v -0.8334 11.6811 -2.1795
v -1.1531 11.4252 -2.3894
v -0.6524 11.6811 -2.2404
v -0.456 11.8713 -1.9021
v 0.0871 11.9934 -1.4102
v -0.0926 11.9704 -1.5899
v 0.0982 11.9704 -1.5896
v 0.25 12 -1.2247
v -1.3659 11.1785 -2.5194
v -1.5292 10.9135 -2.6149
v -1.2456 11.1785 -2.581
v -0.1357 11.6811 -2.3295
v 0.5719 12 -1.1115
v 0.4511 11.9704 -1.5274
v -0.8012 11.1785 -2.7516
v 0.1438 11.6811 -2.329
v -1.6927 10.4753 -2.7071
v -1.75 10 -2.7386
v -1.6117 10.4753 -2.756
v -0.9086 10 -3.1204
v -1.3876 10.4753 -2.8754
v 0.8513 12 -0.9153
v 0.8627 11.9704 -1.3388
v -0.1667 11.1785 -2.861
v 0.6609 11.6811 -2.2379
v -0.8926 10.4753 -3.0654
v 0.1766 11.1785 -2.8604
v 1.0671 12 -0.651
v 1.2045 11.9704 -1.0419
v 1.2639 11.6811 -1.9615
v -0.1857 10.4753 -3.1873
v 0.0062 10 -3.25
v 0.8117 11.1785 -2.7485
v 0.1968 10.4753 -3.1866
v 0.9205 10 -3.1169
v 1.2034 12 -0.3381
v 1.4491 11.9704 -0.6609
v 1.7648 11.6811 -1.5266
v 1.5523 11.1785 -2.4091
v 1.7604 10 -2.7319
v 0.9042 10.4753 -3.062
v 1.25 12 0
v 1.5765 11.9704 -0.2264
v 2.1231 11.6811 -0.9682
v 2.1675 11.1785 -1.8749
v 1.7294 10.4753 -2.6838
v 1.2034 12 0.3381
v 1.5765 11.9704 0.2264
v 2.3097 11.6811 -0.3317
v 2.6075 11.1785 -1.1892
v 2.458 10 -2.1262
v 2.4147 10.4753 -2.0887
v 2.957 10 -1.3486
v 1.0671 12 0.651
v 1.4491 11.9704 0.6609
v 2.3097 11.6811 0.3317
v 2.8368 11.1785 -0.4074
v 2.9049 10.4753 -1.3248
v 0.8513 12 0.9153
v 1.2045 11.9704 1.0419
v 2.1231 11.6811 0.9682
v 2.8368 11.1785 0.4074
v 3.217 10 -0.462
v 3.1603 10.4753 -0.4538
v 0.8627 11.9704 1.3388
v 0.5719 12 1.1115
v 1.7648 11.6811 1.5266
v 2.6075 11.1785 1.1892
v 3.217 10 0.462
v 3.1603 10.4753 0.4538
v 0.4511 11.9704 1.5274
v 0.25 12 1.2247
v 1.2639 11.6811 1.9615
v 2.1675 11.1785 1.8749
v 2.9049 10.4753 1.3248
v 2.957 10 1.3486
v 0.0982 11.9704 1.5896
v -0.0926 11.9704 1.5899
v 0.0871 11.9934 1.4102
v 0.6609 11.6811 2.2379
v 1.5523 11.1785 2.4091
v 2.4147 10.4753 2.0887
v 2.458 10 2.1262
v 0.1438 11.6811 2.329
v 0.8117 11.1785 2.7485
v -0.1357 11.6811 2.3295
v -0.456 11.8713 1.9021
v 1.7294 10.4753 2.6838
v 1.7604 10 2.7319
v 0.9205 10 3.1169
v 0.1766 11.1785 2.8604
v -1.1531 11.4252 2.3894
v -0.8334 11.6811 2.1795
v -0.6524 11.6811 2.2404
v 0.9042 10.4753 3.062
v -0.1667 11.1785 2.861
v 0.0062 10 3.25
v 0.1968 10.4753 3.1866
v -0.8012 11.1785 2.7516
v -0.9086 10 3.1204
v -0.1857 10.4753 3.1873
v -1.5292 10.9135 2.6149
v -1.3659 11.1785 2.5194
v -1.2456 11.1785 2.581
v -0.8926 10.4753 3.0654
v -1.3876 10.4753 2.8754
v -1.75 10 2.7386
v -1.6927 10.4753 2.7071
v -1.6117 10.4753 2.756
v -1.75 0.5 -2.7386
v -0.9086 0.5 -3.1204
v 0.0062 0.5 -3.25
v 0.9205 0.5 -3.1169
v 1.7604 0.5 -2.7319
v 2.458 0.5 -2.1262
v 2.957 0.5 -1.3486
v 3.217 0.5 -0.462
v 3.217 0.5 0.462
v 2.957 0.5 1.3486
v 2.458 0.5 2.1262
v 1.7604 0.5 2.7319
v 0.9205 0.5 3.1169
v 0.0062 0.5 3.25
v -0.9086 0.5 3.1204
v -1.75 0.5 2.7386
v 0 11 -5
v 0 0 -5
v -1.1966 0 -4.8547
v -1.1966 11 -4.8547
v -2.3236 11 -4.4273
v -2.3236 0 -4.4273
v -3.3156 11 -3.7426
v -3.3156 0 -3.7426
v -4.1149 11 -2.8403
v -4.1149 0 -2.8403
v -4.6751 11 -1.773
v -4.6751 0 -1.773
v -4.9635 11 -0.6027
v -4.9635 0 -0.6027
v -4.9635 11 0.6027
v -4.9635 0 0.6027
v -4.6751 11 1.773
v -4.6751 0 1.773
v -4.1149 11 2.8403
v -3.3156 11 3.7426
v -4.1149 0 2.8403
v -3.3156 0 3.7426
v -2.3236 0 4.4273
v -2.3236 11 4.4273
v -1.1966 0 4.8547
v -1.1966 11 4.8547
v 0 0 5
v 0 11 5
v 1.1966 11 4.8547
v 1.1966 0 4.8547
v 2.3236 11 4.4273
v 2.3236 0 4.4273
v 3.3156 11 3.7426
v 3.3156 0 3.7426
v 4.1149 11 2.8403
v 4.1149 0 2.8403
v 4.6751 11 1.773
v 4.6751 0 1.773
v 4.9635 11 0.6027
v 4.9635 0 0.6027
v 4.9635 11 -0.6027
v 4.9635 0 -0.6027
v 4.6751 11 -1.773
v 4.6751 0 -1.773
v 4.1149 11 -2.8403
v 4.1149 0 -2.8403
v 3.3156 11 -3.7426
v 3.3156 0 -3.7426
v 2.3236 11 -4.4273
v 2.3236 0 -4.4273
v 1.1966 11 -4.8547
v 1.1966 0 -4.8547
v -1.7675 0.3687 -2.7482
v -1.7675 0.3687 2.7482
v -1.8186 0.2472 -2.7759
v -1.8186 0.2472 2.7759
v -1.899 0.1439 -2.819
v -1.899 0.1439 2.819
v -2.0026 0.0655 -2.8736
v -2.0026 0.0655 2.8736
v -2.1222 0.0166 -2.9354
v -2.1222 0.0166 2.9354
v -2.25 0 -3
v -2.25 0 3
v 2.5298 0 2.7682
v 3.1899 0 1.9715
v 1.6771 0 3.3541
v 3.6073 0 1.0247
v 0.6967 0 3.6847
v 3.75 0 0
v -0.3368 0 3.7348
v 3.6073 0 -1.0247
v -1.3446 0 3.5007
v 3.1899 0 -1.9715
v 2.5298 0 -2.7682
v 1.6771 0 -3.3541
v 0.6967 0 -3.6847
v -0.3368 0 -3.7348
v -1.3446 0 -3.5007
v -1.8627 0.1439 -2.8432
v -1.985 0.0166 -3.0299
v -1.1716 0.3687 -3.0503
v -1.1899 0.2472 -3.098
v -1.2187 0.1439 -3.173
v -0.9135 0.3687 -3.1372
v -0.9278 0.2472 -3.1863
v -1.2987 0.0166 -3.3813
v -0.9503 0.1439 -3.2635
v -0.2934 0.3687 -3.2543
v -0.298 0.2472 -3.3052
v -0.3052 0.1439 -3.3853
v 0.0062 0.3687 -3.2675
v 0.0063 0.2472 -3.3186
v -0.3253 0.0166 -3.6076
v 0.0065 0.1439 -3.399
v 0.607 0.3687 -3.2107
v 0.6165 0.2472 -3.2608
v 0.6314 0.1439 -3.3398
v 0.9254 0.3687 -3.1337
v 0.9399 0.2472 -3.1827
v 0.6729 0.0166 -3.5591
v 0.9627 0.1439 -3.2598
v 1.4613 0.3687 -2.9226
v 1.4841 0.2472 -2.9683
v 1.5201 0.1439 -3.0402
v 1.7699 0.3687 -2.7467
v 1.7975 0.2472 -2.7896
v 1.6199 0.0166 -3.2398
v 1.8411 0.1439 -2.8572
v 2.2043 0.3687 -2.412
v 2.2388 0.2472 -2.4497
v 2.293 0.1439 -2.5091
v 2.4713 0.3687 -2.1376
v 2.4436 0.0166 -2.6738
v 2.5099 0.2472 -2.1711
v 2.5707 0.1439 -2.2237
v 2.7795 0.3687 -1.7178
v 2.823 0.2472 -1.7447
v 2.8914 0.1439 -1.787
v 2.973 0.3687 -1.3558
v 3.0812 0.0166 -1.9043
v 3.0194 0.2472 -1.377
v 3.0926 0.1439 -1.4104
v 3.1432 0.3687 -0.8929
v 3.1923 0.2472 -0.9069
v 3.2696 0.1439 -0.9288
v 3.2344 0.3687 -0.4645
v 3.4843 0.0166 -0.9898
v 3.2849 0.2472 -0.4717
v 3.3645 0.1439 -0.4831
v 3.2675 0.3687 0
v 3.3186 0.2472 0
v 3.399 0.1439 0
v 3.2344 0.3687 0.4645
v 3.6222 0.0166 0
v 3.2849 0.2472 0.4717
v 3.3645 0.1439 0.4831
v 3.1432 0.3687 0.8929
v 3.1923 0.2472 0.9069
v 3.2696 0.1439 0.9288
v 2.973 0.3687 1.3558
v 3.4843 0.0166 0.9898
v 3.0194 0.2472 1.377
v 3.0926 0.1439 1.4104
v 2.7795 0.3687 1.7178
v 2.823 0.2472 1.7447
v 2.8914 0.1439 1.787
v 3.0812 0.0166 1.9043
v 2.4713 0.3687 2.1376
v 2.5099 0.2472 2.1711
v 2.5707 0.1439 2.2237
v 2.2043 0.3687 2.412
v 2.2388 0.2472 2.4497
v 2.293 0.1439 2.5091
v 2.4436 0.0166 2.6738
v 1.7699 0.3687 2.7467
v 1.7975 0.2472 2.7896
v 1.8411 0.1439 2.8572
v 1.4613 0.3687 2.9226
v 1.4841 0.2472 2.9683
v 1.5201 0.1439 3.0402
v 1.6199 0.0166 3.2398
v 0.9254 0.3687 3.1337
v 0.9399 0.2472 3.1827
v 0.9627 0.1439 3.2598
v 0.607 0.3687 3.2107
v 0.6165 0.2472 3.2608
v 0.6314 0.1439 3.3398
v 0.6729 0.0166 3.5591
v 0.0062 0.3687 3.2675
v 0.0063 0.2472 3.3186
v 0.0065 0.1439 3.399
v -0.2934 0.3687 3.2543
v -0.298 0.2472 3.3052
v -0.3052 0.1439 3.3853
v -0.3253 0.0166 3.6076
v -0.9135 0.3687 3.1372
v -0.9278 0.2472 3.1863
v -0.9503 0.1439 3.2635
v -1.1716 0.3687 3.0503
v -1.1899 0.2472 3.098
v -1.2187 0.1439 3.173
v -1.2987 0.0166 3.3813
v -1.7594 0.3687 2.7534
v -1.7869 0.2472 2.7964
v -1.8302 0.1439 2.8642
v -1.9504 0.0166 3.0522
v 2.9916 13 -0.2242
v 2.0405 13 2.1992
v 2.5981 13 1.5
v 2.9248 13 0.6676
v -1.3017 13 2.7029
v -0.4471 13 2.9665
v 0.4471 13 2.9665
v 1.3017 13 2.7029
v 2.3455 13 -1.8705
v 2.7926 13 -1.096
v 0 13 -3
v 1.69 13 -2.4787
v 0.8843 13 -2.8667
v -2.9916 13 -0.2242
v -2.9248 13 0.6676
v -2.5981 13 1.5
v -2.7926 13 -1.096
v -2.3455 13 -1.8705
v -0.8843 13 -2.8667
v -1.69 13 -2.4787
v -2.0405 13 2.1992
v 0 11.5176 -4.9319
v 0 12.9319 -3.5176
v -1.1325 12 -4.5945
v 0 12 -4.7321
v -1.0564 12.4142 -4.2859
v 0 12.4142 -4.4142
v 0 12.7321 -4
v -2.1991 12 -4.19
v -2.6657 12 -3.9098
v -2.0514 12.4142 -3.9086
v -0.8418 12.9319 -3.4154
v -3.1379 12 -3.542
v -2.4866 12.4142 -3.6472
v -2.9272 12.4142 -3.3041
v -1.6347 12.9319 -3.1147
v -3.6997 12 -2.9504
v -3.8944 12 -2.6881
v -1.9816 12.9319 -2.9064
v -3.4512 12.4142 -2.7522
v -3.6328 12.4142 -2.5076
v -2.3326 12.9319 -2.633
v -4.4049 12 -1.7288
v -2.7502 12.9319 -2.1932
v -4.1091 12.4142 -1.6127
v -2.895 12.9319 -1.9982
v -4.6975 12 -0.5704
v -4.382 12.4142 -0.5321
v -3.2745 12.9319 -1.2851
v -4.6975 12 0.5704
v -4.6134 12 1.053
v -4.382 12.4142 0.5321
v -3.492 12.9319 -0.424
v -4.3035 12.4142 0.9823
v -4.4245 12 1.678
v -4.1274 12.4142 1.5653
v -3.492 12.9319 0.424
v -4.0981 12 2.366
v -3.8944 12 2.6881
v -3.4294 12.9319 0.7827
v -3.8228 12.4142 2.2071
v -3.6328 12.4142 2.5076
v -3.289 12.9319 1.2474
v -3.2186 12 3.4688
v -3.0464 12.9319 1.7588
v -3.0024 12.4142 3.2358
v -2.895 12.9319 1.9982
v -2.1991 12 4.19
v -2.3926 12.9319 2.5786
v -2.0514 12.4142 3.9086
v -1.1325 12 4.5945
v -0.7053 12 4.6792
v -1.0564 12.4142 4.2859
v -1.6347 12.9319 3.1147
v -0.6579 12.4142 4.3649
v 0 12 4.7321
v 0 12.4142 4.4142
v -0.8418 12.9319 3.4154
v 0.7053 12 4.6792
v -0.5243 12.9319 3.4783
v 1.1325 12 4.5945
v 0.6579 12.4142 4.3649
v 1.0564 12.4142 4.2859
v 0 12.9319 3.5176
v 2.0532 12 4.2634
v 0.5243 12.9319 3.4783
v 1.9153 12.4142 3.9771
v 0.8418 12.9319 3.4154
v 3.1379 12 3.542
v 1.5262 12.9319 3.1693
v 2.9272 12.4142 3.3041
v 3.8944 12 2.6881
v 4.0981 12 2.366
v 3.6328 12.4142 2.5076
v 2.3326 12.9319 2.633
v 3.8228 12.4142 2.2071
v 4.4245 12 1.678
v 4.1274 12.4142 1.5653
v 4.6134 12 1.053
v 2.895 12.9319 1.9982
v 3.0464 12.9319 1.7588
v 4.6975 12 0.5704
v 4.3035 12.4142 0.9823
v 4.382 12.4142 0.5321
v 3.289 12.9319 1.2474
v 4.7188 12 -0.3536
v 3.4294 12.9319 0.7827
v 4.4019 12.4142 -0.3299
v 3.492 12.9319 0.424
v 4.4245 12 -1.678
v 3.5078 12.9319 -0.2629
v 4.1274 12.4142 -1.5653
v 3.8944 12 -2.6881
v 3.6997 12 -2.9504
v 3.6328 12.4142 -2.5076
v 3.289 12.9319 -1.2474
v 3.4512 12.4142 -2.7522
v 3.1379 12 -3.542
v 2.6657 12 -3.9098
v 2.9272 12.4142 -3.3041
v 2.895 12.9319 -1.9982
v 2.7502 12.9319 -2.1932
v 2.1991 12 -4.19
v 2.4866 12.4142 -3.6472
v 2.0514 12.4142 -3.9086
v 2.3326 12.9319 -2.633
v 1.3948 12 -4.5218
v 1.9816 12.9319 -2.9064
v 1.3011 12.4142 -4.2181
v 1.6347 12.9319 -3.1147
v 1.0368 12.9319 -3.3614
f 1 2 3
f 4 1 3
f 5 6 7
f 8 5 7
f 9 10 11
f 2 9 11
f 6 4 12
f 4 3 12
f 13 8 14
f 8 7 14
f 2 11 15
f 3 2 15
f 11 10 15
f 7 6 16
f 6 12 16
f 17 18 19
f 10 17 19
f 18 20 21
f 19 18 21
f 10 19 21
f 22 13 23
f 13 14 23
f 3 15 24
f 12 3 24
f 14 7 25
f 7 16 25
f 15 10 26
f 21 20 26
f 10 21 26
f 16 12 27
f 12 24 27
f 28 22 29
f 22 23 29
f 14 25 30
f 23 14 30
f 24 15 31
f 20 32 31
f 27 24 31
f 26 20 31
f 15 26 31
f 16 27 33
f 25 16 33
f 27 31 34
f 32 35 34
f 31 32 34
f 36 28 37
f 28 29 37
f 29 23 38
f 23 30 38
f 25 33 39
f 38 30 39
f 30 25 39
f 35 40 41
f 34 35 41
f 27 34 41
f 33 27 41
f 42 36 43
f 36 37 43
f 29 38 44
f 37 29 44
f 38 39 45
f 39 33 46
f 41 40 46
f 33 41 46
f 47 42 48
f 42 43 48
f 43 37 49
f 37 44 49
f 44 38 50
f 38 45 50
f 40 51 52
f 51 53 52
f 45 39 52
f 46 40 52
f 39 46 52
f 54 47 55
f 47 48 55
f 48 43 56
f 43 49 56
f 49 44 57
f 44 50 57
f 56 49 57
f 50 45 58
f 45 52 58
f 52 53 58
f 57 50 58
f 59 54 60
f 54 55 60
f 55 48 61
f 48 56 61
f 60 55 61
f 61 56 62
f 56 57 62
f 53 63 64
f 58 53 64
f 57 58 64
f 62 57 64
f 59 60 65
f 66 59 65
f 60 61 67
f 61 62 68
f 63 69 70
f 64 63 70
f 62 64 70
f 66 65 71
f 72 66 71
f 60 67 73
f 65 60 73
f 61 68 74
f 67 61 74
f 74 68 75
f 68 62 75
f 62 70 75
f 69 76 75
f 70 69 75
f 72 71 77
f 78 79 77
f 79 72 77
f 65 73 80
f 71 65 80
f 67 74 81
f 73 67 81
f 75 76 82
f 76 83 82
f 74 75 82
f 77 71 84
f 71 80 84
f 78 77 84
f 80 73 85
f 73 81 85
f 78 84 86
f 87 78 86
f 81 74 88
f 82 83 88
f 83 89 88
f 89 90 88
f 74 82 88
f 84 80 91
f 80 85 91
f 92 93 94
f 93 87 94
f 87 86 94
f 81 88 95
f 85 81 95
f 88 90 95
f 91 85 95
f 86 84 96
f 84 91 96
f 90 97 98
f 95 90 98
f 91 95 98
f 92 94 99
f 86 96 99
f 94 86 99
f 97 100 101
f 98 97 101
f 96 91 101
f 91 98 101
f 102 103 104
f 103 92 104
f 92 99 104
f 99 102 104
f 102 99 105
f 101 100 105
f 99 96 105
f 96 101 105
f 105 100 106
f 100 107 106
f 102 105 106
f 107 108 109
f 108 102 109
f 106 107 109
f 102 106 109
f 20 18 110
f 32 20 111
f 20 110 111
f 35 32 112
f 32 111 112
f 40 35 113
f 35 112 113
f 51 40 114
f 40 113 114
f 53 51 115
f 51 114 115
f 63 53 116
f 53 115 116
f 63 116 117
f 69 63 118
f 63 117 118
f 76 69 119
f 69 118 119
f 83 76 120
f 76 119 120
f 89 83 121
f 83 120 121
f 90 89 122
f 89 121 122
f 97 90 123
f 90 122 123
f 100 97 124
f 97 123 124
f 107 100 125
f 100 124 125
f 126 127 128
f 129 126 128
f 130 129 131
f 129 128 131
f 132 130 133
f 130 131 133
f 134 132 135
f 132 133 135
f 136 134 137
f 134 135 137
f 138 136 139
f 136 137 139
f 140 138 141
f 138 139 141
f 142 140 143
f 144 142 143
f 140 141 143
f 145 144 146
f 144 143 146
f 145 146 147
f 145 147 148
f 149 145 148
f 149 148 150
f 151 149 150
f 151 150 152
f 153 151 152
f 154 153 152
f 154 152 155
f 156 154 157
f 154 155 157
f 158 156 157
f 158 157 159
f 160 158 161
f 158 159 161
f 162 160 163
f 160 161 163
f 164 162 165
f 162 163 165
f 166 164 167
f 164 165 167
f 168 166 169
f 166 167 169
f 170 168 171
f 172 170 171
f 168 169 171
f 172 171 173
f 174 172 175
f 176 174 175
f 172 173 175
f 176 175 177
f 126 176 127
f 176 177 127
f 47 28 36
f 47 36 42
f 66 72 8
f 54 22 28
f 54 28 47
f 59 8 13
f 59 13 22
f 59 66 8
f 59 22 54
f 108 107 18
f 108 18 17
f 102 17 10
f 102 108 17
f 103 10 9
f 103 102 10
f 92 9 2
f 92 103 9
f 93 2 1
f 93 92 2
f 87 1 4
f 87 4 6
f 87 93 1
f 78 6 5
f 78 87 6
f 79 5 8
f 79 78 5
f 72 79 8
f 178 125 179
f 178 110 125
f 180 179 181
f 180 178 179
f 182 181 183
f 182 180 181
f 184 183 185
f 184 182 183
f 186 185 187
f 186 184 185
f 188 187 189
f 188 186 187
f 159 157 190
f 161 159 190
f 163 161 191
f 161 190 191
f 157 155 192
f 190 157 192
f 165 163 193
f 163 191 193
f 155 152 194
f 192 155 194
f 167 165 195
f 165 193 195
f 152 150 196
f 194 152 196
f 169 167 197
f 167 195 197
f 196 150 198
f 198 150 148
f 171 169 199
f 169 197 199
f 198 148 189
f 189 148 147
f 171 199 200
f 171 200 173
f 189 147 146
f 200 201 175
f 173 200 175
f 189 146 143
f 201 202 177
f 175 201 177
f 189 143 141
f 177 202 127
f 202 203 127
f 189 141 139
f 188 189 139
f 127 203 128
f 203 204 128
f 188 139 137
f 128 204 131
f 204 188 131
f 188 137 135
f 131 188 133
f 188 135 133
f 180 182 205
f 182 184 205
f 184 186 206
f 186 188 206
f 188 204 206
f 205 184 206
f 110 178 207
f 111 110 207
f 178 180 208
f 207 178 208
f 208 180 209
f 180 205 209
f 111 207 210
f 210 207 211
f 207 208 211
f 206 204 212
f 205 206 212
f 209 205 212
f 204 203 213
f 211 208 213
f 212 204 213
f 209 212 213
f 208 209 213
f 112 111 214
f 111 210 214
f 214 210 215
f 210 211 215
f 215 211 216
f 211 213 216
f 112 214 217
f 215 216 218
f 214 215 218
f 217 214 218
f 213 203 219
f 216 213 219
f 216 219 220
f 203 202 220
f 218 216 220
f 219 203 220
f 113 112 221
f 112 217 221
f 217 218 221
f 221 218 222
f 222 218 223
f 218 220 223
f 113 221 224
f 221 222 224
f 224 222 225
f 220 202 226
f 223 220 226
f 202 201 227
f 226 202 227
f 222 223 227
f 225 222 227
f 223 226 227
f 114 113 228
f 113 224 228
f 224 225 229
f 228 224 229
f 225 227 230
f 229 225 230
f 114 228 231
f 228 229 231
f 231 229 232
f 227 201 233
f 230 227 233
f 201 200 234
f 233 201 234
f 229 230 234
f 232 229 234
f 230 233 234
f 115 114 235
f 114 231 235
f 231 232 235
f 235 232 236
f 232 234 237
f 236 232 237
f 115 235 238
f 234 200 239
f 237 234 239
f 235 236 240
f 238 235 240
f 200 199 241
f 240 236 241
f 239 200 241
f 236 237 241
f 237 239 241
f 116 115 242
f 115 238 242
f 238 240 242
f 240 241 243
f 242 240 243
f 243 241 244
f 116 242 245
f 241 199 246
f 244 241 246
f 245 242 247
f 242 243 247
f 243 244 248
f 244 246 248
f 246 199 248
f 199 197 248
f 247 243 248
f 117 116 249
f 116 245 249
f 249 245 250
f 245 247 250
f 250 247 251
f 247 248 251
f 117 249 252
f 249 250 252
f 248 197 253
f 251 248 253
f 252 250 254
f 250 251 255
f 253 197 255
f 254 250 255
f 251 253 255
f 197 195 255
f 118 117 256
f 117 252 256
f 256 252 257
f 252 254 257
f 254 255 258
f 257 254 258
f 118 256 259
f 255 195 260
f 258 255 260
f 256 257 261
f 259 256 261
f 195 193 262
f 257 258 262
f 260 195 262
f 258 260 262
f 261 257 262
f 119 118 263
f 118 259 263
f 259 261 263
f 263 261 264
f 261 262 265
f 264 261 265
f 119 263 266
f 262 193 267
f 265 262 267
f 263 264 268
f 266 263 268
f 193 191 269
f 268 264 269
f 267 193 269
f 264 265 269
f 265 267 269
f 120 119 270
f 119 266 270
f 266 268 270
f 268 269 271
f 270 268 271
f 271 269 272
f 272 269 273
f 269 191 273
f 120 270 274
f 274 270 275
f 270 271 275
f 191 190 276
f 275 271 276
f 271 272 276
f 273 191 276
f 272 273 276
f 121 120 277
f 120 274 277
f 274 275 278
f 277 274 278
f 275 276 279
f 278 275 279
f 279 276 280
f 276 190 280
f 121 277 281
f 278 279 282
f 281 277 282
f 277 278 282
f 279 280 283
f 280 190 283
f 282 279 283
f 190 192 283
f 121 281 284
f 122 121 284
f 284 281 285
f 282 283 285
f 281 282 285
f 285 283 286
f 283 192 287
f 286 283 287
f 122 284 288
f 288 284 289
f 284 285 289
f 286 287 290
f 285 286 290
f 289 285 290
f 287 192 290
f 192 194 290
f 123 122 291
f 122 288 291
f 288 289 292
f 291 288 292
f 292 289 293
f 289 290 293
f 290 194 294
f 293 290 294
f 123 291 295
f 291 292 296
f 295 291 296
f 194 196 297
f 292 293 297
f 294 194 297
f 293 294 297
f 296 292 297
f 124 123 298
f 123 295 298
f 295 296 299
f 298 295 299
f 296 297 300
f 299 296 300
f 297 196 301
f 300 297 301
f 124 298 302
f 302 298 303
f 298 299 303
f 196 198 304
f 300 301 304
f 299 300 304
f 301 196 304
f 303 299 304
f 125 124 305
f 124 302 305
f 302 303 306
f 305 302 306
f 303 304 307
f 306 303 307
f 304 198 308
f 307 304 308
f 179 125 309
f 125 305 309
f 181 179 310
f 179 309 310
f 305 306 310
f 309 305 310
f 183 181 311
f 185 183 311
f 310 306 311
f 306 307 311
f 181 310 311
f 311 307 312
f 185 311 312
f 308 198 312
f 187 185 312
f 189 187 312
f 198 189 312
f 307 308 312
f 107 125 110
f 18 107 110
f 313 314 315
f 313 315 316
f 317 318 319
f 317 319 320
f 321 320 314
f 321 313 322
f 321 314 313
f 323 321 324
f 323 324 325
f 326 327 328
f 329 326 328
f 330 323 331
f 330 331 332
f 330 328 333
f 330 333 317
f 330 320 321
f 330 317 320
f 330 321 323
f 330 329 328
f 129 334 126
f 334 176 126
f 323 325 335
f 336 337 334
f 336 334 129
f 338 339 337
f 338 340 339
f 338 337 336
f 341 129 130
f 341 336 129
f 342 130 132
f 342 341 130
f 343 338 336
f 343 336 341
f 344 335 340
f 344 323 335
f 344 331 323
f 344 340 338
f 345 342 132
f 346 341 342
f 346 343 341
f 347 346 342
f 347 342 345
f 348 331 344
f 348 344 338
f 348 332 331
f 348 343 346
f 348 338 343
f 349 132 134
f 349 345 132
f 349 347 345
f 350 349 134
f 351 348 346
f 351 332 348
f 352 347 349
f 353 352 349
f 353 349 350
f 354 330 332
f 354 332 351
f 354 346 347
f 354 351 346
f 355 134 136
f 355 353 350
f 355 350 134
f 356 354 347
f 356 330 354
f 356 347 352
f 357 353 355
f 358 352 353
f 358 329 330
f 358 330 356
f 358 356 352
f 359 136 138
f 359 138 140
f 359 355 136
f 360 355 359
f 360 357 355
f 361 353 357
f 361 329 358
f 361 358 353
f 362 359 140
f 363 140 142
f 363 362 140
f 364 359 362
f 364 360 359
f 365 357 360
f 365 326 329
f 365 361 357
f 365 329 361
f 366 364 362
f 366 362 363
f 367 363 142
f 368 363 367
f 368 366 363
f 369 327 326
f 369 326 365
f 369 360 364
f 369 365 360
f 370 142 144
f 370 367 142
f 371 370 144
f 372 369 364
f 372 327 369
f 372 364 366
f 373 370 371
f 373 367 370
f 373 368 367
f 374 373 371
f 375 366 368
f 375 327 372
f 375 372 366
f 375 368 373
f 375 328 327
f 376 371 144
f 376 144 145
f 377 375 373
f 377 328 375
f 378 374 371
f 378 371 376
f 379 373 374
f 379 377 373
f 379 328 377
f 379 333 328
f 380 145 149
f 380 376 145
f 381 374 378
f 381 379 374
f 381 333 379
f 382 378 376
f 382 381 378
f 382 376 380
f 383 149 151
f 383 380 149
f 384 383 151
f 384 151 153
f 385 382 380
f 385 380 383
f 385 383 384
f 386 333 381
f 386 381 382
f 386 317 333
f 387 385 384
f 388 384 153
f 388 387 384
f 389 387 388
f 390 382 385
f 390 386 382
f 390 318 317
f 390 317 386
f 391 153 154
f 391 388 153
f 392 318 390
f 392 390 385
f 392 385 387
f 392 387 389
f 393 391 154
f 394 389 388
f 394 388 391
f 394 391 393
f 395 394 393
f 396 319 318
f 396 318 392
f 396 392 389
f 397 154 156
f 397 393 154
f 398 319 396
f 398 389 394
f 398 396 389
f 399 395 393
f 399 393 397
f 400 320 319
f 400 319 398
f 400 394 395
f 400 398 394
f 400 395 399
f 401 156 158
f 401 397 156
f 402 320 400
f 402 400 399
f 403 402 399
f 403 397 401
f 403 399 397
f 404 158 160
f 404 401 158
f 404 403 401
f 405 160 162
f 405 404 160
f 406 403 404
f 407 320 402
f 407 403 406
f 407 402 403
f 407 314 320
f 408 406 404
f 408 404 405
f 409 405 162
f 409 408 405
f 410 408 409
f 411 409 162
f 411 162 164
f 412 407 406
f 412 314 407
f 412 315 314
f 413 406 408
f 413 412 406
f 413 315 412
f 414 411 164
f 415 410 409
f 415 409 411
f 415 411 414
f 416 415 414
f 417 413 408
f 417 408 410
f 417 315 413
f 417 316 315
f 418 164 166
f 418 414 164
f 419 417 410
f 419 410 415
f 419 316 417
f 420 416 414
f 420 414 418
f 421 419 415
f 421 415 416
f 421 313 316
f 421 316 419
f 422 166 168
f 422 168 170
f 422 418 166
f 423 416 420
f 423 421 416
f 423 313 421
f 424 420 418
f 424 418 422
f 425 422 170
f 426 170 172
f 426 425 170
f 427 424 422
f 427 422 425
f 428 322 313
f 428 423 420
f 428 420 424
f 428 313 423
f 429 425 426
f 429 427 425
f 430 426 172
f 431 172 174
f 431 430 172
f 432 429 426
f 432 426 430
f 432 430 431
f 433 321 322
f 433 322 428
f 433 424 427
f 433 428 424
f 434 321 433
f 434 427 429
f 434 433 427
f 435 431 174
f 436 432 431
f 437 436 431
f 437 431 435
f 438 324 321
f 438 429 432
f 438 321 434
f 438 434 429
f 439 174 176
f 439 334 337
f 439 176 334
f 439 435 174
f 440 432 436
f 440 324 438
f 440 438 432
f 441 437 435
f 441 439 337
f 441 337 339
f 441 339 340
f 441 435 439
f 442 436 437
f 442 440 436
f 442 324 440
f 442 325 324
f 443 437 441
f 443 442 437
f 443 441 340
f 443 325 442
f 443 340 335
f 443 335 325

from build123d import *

# Parameters (mm, degrees)
SKETCH1_R           = 5
BOSS_EXTRUDE1_DEPTH = 13
CUT_EXTRUDE1_DEPTH  = 12
FILLET4_R           = 2
FILLET5_R           = 0.5
FILLET6_R           = 2


with BuildPart() as part:
    # Sketch1 → Boss-Extrude1 (new body)
    with BuildSketch(Plane(origin=(0, 0, 0), x_dir=(1, 0, 0), z_dir=(0, 1, 0))):
        with Locations(Location((0, 0, 0), (0, 0, 90))):
            Circle(SKETCH1_R)
    extrude(amount=BOSS_EXTRUDE1_DEPTH)

    # Insert → Cut-Extrude1 (cut)
    with BuildSketch(Plane.XZ):
        with BuildLine():
            Line((-1.75, 2.738612788), (-1.75, -2.738612788))
            ThreePointArc((-1.75, -2.738612788), (3.25, 0), (-1.75, 2.738612788))
        make_face()
    extrude(amount=-CUT_EXTRUDE1_DEPTH, mode=Mode.SUBTRACT)

    # Fillet4
    # the kernel refuses this fillet: 2 mm, written as the material it adds along each edge
    with BuildSketch(Plane(origin=(0, 12, 0), x_dir=(-0.9999950652018582, 0, -0.0031415874858799196), z_dir=(-0.0031415874858799196, 0, 0.9999950652018582))) as fillet4_piece_1:
        with BuildLine():
            CenterArc((3.25 - FILLET4_R, FILLET4_R), FILLET4_R, 270, 90)
            Line((3.25 - FILLET4_R, 0), (3.25, 0))
            Line((3.25, 0), (3.25, FILLET4_R))
        make_face()
    revolve(axis=Axis((0, 12, 0), (0, -1, 0)), revolution_arc=359.64)
    with BuildSketch(Plane(origin=(-1.75, 12, 7.738612788), x_dir=(0, -1, 0), z_dir=(0, 0, -1))) as fillet4_piece_2_section:
        with BuildLine():
            CenterArc((FILLET4_R, -FILLET4_R), FILLET4_R, 90, 90)
            Line((0, -FILLET4_R), (0, 0))
            Line((0, 0), (FILLET4_R, 0))
        make_face()
    fillet4_piece_2 = extrude(amount=15.477225575, mode=Mode.PRIVATE)
    fillet4_piece_2 = fillet4_piece_2 & Plane(origin=(0, 11.564510451, 0), x_dir=(-0.5384615384615385, 0, -0.8426500884694863), z_dir=(0, -1, 0)) * Cylinder(3.25, 39, mode=Mode.PRIVATE)
    add(fillet4_piece_2)

    # Fillet5
    fillet5_edges = [part.edges().sort_by_distance(p)[0] for p in [
        (3.25, 0, 0),
        (-1.75, 0, 0),
    ]]
    fillet(fillet5_edges, radius=FILLET5_R)

    # Fillet6
    fillet6_edges = [part.edges().sort_by_distance(p)[0] for p in [
        (0, 13, 5),
    ]]
    fillet(fillet6_edges, radius=FILLET6_R)


solid = part.part
